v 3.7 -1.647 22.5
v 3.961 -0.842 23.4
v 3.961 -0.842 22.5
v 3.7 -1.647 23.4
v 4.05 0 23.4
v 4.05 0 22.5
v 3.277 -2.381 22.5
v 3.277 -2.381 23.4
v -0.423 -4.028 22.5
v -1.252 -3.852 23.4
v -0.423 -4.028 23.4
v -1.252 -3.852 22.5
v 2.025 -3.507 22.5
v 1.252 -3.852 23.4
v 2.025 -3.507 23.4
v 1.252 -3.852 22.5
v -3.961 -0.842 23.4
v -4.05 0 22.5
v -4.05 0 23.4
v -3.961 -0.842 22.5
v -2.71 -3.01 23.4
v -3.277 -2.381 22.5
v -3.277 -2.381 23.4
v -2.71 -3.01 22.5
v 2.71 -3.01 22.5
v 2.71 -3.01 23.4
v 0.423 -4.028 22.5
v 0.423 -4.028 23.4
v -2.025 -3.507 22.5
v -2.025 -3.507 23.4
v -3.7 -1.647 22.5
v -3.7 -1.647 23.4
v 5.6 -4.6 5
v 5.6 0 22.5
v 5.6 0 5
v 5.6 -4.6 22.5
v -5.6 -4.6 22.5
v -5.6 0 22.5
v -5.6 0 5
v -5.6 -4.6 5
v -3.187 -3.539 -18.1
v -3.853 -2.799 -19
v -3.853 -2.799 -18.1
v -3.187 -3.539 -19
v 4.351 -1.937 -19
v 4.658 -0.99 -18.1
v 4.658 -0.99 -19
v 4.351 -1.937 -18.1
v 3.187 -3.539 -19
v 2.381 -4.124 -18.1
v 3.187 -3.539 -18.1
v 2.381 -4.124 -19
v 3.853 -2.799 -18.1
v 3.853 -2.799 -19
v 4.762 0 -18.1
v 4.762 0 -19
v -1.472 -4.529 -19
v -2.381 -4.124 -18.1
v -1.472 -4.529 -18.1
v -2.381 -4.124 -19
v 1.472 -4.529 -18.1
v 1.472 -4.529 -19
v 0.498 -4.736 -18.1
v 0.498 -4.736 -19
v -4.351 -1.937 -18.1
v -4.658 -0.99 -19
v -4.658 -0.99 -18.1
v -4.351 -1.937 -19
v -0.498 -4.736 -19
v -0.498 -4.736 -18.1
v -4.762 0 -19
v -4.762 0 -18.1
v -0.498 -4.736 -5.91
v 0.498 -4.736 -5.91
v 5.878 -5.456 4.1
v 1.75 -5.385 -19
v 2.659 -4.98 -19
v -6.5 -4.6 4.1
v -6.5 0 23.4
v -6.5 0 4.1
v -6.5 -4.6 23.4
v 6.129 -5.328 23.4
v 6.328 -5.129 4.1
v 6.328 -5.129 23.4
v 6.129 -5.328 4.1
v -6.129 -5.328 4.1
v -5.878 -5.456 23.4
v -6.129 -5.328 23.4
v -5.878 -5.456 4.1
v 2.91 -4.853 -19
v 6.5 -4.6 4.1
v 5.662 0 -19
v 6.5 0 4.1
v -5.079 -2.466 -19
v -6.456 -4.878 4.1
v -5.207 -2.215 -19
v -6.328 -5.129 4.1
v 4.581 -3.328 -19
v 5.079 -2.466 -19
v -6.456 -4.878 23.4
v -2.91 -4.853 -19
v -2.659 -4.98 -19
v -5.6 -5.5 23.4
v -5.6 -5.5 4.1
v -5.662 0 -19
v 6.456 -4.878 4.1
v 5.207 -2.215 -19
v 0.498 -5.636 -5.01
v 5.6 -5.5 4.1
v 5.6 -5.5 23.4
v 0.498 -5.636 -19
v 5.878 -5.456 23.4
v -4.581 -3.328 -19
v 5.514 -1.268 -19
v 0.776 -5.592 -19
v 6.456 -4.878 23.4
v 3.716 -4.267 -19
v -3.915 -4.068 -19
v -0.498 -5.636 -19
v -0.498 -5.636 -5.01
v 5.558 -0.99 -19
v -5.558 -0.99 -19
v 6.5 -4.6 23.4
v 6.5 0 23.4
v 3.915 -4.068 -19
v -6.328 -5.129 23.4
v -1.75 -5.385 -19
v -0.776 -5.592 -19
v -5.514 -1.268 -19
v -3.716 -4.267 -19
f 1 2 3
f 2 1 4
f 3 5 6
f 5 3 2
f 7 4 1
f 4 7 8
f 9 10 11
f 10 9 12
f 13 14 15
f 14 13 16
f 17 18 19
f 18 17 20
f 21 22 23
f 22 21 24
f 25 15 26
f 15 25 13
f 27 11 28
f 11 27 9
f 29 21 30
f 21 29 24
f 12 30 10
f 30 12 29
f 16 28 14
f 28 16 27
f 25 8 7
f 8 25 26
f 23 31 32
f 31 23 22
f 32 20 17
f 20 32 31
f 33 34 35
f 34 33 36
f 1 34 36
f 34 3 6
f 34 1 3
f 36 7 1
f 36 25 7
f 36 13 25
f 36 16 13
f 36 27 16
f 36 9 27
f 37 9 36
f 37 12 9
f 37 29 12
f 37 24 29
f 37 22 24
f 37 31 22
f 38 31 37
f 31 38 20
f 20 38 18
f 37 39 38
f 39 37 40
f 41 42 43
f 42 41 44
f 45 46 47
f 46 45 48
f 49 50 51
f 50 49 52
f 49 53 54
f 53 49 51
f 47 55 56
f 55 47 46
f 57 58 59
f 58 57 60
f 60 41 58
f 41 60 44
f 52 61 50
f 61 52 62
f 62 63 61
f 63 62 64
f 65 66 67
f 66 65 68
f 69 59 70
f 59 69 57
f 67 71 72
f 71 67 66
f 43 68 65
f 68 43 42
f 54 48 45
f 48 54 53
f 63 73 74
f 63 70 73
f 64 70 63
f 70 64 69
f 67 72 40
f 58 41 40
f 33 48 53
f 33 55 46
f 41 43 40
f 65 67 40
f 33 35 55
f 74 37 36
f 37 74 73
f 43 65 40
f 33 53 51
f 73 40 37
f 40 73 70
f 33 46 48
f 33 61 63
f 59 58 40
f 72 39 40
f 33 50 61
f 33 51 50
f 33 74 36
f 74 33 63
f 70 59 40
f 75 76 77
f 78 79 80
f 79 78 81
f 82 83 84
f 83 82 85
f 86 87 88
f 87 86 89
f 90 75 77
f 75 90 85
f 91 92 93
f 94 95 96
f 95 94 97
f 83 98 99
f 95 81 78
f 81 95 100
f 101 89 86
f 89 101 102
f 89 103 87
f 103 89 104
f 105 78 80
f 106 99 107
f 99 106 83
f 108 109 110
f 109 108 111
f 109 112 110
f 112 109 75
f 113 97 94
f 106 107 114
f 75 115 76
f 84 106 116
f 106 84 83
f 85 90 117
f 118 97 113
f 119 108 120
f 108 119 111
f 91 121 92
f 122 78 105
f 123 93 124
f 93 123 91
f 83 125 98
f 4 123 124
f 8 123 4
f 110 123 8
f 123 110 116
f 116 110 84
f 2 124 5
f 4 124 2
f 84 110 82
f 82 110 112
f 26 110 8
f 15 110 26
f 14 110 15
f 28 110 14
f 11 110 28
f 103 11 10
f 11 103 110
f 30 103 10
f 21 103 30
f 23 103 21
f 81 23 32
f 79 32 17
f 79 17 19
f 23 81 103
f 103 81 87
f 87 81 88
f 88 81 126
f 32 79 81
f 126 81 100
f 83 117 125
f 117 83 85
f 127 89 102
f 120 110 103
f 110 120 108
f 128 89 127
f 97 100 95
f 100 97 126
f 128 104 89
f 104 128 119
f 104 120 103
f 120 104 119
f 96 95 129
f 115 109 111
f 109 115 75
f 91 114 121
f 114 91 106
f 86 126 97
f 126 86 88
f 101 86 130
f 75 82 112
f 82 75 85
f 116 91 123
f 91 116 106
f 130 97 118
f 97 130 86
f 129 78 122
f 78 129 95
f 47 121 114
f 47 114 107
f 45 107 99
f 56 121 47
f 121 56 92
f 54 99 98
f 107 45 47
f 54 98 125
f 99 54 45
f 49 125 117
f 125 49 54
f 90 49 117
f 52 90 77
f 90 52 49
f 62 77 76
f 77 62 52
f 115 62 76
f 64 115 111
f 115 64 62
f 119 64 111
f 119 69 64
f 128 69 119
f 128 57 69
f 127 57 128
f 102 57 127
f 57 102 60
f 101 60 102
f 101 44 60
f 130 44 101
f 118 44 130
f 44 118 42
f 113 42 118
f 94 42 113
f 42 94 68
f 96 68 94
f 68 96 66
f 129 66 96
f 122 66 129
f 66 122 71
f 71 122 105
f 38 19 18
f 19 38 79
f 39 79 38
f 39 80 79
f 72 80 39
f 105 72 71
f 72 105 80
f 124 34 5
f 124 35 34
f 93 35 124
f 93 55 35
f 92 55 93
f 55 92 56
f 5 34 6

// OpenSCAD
wall_thickness = 0.9;

epsilon = 0.01;


main();


module main() {
    connector_adapter_box(bnc_space, trs_space) {
        bnc_112420_neg();
        
        trs_neg();
    }
    
    %position_first_connector(bnc_space) bnc_112420_model();
    %position_second_connector(trs_space) trs_neg();
}


// Children are two hollows for connector
module connector_adapter_box(a_space, b_space) {
    difference() {
        minkowski() {
            cylinder(d=wall_thickness * 2, h=wall_thickness * 2, center=true, $fn=20);
            interior_volume() { children(0); children(1); }
        }
        
        cutout_volume() { children(0); children(1); }

        translate([-50, 0, -50])
        cube([100, 100, 100]);
    }
        
    module interior_volume() {
        hull() {
            position_first_connector(a_space)
            top_half()
            children(0);
            
            position_second_connector(b_space)
            top_half()
            children(1);
        }
    }
        
    module cutout_volume() {
        union() {
            position_first_connector(a_space)
            children(0);
            
            position_second_connector(b_space)
            children(1);
            
            // cut the hull
            interior_volume() { children(0); children(1); }
        }
    }
}

module position_first_connector(space) {
    translate([0, 0, -space]) children();
}
module position_second_connector(space) {
    rotate([180, 0, 0])
    translate([0, 0, -space]) 
    children();
}

module top_half() {
    intersection() {
        translate([-50, -50, 0])
        cube([100, 100, 100]);
        
        children();
    }
}

// Amphenol 112420 per https://www.amphenolrf.com/112420.html
bnc_shell_length = 8.8;
bnc_solder_cup_length = 4.3;
bnc_space = bnc_shell_length + bnc_solder_cup_length + 5;
module bnc_112420_neg() {
    // thread clearance
    // TODO ensure tooth-biting fit
    translate([0, 0, -wall_thickness - epsilon])
    cylinder(d=3/8 * 25.4, h=bnc_shell_length + bnc_solder_cup_length, $fn=30);
}
module bnc_112420_model() {
    translate([0, 0, -wall_thickness - epsilon]) {
        cylinder(d=3/8 * 25.4, h=bnc_shell_length, $fn=30);
        cylinder(d=2.1, h=bnc_shell_length + bnc_solder_cup_length, $fn=30);
    }
}

// LJE0352-4R per http://www.fk-industrie.de/downloads/LJE0352s.pdf
trs_length = 13.5 + 4.0;  // from datasheet
trs_box_d1 = 11.2;  // asymmetric, max extent is 5.5 from center
trs_box_d2 = 9.2;  // 9.0 + tolerance added
trs_space = trs_length + 5;
module trs_neg() {
    // thread area
    translate([0, 0, -3.5 + epsilon])
    cylinder(d=8.1, h=3.5, $fn=30);
    
    // box area
    translate([-trs_box_d1 / 2, -trs_box_d2 / 2, 0])
    cube([trs_box_d1, trs_box_d2, trs_length]);
}
